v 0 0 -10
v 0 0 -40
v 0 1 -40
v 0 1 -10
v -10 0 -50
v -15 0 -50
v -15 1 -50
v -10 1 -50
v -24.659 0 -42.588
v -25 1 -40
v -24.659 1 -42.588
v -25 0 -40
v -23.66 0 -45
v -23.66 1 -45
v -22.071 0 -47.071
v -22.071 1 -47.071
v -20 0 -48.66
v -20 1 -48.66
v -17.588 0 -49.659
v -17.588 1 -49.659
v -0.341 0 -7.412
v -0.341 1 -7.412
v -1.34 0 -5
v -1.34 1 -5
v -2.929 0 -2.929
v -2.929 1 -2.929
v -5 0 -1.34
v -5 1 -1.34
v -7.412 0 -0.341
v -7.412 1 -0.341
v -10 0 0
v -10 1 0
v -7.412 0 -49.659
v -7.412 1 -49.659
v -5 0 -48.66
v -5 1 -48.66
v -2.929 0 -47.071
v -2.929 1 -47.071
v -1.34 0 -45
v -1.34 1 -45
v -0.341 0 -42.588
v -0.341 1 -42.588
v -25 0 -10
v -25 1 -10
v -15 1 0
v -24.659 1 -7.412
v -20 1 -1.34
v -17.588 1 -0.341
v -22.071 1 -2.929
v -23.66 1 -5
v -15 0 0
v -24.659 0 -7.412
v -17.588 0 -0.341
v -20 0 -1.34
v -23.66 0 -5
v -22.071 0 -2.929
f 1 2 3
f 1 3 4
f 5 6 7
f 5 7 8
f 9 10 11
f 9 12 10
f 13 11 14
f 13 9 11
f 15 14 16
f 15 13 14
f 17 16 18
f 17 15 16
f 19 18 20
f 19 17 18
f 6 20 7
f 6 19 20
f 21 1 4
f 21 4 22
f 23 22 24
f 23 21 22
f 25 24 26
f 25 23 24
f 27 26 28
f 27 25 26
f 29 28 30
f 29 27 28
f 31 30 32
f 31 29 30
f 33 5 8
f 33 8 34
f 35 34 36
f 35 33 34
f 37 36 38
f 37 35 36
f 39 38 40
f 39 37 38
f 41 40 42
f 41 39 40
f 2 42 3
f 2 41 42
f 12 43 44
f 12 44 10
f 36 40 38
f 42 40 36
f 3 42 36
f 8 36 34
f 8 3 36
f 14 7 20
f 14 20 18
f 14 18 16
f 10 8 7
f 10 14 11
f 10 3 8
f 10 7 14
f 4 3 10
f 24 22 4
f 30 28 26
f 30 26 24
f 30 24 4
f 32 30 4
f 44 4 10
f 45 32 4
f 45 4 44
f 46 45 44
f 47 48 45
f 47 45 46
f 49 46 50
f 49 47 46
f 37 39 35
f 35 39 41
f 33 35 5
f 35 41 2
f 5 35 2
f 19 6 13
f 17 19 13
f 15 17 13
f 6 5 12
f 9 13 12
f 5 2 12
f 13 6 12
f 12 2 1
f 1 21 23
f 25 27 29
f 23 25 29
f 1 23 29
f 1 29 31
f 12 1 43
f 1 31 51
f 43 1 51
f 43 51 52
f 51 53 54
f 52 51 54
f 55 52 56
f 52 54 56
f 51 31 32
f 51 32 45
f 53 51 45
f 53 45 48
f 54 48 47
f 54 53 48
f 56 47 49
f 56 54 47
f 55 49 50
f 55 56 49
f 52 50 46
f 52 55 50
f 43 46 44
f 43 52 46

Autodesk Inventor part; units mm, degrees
ref_plane "YZ Plane" through (0, 0, 0) normal (1, 0, 0) x (0, 1, 0)
ref_plane "XZ Plane" through (0, 0, 0) normal (0, 1, 0) x (-1, 0, 0)
ref_plane "XY Plane" through (0, 0, 0) normal (0, 0, 1) x (1, 0, 0)
sketch "Sketch1" plane through (0, 0, 0) normal (0, 1, 0) x (-1, 0, 0)
  line L0 (10, 0) -> (15, 0)
  line L1 (25, -10) -> (25, -40)
  line L2 (15, -50) -> (10, -50)
  line L3 (0, -40) -> (0, -10)
  arc A0 (25, -2) -> (23, 0) centre (23, -2) ccw
  arc A1 (25, -10) -> (15, 0) centre (15, -10) ccw
  arc A2 (10, 0) -> (0, -10) centre (10, -10) ccw
  arc A3 (0, -40) -> (10, -50) centre (10, -40) ccw
  arc A4 (15, -50) -> (25, -40) centre (15, -40) ccw
  point P0 (0, 0)
  point P1 (25, -50)
  point P2 (25, 0)
  point P3 (0, -50)
  dimension "d0" = 25
  dimension "d1" = 50
  dimension "d2" = 2
  dimension "d3" = 10
extrude "Extrusion1" add sketch "Sketch1" along normal blind 1
properties part number "popsicle stick"
